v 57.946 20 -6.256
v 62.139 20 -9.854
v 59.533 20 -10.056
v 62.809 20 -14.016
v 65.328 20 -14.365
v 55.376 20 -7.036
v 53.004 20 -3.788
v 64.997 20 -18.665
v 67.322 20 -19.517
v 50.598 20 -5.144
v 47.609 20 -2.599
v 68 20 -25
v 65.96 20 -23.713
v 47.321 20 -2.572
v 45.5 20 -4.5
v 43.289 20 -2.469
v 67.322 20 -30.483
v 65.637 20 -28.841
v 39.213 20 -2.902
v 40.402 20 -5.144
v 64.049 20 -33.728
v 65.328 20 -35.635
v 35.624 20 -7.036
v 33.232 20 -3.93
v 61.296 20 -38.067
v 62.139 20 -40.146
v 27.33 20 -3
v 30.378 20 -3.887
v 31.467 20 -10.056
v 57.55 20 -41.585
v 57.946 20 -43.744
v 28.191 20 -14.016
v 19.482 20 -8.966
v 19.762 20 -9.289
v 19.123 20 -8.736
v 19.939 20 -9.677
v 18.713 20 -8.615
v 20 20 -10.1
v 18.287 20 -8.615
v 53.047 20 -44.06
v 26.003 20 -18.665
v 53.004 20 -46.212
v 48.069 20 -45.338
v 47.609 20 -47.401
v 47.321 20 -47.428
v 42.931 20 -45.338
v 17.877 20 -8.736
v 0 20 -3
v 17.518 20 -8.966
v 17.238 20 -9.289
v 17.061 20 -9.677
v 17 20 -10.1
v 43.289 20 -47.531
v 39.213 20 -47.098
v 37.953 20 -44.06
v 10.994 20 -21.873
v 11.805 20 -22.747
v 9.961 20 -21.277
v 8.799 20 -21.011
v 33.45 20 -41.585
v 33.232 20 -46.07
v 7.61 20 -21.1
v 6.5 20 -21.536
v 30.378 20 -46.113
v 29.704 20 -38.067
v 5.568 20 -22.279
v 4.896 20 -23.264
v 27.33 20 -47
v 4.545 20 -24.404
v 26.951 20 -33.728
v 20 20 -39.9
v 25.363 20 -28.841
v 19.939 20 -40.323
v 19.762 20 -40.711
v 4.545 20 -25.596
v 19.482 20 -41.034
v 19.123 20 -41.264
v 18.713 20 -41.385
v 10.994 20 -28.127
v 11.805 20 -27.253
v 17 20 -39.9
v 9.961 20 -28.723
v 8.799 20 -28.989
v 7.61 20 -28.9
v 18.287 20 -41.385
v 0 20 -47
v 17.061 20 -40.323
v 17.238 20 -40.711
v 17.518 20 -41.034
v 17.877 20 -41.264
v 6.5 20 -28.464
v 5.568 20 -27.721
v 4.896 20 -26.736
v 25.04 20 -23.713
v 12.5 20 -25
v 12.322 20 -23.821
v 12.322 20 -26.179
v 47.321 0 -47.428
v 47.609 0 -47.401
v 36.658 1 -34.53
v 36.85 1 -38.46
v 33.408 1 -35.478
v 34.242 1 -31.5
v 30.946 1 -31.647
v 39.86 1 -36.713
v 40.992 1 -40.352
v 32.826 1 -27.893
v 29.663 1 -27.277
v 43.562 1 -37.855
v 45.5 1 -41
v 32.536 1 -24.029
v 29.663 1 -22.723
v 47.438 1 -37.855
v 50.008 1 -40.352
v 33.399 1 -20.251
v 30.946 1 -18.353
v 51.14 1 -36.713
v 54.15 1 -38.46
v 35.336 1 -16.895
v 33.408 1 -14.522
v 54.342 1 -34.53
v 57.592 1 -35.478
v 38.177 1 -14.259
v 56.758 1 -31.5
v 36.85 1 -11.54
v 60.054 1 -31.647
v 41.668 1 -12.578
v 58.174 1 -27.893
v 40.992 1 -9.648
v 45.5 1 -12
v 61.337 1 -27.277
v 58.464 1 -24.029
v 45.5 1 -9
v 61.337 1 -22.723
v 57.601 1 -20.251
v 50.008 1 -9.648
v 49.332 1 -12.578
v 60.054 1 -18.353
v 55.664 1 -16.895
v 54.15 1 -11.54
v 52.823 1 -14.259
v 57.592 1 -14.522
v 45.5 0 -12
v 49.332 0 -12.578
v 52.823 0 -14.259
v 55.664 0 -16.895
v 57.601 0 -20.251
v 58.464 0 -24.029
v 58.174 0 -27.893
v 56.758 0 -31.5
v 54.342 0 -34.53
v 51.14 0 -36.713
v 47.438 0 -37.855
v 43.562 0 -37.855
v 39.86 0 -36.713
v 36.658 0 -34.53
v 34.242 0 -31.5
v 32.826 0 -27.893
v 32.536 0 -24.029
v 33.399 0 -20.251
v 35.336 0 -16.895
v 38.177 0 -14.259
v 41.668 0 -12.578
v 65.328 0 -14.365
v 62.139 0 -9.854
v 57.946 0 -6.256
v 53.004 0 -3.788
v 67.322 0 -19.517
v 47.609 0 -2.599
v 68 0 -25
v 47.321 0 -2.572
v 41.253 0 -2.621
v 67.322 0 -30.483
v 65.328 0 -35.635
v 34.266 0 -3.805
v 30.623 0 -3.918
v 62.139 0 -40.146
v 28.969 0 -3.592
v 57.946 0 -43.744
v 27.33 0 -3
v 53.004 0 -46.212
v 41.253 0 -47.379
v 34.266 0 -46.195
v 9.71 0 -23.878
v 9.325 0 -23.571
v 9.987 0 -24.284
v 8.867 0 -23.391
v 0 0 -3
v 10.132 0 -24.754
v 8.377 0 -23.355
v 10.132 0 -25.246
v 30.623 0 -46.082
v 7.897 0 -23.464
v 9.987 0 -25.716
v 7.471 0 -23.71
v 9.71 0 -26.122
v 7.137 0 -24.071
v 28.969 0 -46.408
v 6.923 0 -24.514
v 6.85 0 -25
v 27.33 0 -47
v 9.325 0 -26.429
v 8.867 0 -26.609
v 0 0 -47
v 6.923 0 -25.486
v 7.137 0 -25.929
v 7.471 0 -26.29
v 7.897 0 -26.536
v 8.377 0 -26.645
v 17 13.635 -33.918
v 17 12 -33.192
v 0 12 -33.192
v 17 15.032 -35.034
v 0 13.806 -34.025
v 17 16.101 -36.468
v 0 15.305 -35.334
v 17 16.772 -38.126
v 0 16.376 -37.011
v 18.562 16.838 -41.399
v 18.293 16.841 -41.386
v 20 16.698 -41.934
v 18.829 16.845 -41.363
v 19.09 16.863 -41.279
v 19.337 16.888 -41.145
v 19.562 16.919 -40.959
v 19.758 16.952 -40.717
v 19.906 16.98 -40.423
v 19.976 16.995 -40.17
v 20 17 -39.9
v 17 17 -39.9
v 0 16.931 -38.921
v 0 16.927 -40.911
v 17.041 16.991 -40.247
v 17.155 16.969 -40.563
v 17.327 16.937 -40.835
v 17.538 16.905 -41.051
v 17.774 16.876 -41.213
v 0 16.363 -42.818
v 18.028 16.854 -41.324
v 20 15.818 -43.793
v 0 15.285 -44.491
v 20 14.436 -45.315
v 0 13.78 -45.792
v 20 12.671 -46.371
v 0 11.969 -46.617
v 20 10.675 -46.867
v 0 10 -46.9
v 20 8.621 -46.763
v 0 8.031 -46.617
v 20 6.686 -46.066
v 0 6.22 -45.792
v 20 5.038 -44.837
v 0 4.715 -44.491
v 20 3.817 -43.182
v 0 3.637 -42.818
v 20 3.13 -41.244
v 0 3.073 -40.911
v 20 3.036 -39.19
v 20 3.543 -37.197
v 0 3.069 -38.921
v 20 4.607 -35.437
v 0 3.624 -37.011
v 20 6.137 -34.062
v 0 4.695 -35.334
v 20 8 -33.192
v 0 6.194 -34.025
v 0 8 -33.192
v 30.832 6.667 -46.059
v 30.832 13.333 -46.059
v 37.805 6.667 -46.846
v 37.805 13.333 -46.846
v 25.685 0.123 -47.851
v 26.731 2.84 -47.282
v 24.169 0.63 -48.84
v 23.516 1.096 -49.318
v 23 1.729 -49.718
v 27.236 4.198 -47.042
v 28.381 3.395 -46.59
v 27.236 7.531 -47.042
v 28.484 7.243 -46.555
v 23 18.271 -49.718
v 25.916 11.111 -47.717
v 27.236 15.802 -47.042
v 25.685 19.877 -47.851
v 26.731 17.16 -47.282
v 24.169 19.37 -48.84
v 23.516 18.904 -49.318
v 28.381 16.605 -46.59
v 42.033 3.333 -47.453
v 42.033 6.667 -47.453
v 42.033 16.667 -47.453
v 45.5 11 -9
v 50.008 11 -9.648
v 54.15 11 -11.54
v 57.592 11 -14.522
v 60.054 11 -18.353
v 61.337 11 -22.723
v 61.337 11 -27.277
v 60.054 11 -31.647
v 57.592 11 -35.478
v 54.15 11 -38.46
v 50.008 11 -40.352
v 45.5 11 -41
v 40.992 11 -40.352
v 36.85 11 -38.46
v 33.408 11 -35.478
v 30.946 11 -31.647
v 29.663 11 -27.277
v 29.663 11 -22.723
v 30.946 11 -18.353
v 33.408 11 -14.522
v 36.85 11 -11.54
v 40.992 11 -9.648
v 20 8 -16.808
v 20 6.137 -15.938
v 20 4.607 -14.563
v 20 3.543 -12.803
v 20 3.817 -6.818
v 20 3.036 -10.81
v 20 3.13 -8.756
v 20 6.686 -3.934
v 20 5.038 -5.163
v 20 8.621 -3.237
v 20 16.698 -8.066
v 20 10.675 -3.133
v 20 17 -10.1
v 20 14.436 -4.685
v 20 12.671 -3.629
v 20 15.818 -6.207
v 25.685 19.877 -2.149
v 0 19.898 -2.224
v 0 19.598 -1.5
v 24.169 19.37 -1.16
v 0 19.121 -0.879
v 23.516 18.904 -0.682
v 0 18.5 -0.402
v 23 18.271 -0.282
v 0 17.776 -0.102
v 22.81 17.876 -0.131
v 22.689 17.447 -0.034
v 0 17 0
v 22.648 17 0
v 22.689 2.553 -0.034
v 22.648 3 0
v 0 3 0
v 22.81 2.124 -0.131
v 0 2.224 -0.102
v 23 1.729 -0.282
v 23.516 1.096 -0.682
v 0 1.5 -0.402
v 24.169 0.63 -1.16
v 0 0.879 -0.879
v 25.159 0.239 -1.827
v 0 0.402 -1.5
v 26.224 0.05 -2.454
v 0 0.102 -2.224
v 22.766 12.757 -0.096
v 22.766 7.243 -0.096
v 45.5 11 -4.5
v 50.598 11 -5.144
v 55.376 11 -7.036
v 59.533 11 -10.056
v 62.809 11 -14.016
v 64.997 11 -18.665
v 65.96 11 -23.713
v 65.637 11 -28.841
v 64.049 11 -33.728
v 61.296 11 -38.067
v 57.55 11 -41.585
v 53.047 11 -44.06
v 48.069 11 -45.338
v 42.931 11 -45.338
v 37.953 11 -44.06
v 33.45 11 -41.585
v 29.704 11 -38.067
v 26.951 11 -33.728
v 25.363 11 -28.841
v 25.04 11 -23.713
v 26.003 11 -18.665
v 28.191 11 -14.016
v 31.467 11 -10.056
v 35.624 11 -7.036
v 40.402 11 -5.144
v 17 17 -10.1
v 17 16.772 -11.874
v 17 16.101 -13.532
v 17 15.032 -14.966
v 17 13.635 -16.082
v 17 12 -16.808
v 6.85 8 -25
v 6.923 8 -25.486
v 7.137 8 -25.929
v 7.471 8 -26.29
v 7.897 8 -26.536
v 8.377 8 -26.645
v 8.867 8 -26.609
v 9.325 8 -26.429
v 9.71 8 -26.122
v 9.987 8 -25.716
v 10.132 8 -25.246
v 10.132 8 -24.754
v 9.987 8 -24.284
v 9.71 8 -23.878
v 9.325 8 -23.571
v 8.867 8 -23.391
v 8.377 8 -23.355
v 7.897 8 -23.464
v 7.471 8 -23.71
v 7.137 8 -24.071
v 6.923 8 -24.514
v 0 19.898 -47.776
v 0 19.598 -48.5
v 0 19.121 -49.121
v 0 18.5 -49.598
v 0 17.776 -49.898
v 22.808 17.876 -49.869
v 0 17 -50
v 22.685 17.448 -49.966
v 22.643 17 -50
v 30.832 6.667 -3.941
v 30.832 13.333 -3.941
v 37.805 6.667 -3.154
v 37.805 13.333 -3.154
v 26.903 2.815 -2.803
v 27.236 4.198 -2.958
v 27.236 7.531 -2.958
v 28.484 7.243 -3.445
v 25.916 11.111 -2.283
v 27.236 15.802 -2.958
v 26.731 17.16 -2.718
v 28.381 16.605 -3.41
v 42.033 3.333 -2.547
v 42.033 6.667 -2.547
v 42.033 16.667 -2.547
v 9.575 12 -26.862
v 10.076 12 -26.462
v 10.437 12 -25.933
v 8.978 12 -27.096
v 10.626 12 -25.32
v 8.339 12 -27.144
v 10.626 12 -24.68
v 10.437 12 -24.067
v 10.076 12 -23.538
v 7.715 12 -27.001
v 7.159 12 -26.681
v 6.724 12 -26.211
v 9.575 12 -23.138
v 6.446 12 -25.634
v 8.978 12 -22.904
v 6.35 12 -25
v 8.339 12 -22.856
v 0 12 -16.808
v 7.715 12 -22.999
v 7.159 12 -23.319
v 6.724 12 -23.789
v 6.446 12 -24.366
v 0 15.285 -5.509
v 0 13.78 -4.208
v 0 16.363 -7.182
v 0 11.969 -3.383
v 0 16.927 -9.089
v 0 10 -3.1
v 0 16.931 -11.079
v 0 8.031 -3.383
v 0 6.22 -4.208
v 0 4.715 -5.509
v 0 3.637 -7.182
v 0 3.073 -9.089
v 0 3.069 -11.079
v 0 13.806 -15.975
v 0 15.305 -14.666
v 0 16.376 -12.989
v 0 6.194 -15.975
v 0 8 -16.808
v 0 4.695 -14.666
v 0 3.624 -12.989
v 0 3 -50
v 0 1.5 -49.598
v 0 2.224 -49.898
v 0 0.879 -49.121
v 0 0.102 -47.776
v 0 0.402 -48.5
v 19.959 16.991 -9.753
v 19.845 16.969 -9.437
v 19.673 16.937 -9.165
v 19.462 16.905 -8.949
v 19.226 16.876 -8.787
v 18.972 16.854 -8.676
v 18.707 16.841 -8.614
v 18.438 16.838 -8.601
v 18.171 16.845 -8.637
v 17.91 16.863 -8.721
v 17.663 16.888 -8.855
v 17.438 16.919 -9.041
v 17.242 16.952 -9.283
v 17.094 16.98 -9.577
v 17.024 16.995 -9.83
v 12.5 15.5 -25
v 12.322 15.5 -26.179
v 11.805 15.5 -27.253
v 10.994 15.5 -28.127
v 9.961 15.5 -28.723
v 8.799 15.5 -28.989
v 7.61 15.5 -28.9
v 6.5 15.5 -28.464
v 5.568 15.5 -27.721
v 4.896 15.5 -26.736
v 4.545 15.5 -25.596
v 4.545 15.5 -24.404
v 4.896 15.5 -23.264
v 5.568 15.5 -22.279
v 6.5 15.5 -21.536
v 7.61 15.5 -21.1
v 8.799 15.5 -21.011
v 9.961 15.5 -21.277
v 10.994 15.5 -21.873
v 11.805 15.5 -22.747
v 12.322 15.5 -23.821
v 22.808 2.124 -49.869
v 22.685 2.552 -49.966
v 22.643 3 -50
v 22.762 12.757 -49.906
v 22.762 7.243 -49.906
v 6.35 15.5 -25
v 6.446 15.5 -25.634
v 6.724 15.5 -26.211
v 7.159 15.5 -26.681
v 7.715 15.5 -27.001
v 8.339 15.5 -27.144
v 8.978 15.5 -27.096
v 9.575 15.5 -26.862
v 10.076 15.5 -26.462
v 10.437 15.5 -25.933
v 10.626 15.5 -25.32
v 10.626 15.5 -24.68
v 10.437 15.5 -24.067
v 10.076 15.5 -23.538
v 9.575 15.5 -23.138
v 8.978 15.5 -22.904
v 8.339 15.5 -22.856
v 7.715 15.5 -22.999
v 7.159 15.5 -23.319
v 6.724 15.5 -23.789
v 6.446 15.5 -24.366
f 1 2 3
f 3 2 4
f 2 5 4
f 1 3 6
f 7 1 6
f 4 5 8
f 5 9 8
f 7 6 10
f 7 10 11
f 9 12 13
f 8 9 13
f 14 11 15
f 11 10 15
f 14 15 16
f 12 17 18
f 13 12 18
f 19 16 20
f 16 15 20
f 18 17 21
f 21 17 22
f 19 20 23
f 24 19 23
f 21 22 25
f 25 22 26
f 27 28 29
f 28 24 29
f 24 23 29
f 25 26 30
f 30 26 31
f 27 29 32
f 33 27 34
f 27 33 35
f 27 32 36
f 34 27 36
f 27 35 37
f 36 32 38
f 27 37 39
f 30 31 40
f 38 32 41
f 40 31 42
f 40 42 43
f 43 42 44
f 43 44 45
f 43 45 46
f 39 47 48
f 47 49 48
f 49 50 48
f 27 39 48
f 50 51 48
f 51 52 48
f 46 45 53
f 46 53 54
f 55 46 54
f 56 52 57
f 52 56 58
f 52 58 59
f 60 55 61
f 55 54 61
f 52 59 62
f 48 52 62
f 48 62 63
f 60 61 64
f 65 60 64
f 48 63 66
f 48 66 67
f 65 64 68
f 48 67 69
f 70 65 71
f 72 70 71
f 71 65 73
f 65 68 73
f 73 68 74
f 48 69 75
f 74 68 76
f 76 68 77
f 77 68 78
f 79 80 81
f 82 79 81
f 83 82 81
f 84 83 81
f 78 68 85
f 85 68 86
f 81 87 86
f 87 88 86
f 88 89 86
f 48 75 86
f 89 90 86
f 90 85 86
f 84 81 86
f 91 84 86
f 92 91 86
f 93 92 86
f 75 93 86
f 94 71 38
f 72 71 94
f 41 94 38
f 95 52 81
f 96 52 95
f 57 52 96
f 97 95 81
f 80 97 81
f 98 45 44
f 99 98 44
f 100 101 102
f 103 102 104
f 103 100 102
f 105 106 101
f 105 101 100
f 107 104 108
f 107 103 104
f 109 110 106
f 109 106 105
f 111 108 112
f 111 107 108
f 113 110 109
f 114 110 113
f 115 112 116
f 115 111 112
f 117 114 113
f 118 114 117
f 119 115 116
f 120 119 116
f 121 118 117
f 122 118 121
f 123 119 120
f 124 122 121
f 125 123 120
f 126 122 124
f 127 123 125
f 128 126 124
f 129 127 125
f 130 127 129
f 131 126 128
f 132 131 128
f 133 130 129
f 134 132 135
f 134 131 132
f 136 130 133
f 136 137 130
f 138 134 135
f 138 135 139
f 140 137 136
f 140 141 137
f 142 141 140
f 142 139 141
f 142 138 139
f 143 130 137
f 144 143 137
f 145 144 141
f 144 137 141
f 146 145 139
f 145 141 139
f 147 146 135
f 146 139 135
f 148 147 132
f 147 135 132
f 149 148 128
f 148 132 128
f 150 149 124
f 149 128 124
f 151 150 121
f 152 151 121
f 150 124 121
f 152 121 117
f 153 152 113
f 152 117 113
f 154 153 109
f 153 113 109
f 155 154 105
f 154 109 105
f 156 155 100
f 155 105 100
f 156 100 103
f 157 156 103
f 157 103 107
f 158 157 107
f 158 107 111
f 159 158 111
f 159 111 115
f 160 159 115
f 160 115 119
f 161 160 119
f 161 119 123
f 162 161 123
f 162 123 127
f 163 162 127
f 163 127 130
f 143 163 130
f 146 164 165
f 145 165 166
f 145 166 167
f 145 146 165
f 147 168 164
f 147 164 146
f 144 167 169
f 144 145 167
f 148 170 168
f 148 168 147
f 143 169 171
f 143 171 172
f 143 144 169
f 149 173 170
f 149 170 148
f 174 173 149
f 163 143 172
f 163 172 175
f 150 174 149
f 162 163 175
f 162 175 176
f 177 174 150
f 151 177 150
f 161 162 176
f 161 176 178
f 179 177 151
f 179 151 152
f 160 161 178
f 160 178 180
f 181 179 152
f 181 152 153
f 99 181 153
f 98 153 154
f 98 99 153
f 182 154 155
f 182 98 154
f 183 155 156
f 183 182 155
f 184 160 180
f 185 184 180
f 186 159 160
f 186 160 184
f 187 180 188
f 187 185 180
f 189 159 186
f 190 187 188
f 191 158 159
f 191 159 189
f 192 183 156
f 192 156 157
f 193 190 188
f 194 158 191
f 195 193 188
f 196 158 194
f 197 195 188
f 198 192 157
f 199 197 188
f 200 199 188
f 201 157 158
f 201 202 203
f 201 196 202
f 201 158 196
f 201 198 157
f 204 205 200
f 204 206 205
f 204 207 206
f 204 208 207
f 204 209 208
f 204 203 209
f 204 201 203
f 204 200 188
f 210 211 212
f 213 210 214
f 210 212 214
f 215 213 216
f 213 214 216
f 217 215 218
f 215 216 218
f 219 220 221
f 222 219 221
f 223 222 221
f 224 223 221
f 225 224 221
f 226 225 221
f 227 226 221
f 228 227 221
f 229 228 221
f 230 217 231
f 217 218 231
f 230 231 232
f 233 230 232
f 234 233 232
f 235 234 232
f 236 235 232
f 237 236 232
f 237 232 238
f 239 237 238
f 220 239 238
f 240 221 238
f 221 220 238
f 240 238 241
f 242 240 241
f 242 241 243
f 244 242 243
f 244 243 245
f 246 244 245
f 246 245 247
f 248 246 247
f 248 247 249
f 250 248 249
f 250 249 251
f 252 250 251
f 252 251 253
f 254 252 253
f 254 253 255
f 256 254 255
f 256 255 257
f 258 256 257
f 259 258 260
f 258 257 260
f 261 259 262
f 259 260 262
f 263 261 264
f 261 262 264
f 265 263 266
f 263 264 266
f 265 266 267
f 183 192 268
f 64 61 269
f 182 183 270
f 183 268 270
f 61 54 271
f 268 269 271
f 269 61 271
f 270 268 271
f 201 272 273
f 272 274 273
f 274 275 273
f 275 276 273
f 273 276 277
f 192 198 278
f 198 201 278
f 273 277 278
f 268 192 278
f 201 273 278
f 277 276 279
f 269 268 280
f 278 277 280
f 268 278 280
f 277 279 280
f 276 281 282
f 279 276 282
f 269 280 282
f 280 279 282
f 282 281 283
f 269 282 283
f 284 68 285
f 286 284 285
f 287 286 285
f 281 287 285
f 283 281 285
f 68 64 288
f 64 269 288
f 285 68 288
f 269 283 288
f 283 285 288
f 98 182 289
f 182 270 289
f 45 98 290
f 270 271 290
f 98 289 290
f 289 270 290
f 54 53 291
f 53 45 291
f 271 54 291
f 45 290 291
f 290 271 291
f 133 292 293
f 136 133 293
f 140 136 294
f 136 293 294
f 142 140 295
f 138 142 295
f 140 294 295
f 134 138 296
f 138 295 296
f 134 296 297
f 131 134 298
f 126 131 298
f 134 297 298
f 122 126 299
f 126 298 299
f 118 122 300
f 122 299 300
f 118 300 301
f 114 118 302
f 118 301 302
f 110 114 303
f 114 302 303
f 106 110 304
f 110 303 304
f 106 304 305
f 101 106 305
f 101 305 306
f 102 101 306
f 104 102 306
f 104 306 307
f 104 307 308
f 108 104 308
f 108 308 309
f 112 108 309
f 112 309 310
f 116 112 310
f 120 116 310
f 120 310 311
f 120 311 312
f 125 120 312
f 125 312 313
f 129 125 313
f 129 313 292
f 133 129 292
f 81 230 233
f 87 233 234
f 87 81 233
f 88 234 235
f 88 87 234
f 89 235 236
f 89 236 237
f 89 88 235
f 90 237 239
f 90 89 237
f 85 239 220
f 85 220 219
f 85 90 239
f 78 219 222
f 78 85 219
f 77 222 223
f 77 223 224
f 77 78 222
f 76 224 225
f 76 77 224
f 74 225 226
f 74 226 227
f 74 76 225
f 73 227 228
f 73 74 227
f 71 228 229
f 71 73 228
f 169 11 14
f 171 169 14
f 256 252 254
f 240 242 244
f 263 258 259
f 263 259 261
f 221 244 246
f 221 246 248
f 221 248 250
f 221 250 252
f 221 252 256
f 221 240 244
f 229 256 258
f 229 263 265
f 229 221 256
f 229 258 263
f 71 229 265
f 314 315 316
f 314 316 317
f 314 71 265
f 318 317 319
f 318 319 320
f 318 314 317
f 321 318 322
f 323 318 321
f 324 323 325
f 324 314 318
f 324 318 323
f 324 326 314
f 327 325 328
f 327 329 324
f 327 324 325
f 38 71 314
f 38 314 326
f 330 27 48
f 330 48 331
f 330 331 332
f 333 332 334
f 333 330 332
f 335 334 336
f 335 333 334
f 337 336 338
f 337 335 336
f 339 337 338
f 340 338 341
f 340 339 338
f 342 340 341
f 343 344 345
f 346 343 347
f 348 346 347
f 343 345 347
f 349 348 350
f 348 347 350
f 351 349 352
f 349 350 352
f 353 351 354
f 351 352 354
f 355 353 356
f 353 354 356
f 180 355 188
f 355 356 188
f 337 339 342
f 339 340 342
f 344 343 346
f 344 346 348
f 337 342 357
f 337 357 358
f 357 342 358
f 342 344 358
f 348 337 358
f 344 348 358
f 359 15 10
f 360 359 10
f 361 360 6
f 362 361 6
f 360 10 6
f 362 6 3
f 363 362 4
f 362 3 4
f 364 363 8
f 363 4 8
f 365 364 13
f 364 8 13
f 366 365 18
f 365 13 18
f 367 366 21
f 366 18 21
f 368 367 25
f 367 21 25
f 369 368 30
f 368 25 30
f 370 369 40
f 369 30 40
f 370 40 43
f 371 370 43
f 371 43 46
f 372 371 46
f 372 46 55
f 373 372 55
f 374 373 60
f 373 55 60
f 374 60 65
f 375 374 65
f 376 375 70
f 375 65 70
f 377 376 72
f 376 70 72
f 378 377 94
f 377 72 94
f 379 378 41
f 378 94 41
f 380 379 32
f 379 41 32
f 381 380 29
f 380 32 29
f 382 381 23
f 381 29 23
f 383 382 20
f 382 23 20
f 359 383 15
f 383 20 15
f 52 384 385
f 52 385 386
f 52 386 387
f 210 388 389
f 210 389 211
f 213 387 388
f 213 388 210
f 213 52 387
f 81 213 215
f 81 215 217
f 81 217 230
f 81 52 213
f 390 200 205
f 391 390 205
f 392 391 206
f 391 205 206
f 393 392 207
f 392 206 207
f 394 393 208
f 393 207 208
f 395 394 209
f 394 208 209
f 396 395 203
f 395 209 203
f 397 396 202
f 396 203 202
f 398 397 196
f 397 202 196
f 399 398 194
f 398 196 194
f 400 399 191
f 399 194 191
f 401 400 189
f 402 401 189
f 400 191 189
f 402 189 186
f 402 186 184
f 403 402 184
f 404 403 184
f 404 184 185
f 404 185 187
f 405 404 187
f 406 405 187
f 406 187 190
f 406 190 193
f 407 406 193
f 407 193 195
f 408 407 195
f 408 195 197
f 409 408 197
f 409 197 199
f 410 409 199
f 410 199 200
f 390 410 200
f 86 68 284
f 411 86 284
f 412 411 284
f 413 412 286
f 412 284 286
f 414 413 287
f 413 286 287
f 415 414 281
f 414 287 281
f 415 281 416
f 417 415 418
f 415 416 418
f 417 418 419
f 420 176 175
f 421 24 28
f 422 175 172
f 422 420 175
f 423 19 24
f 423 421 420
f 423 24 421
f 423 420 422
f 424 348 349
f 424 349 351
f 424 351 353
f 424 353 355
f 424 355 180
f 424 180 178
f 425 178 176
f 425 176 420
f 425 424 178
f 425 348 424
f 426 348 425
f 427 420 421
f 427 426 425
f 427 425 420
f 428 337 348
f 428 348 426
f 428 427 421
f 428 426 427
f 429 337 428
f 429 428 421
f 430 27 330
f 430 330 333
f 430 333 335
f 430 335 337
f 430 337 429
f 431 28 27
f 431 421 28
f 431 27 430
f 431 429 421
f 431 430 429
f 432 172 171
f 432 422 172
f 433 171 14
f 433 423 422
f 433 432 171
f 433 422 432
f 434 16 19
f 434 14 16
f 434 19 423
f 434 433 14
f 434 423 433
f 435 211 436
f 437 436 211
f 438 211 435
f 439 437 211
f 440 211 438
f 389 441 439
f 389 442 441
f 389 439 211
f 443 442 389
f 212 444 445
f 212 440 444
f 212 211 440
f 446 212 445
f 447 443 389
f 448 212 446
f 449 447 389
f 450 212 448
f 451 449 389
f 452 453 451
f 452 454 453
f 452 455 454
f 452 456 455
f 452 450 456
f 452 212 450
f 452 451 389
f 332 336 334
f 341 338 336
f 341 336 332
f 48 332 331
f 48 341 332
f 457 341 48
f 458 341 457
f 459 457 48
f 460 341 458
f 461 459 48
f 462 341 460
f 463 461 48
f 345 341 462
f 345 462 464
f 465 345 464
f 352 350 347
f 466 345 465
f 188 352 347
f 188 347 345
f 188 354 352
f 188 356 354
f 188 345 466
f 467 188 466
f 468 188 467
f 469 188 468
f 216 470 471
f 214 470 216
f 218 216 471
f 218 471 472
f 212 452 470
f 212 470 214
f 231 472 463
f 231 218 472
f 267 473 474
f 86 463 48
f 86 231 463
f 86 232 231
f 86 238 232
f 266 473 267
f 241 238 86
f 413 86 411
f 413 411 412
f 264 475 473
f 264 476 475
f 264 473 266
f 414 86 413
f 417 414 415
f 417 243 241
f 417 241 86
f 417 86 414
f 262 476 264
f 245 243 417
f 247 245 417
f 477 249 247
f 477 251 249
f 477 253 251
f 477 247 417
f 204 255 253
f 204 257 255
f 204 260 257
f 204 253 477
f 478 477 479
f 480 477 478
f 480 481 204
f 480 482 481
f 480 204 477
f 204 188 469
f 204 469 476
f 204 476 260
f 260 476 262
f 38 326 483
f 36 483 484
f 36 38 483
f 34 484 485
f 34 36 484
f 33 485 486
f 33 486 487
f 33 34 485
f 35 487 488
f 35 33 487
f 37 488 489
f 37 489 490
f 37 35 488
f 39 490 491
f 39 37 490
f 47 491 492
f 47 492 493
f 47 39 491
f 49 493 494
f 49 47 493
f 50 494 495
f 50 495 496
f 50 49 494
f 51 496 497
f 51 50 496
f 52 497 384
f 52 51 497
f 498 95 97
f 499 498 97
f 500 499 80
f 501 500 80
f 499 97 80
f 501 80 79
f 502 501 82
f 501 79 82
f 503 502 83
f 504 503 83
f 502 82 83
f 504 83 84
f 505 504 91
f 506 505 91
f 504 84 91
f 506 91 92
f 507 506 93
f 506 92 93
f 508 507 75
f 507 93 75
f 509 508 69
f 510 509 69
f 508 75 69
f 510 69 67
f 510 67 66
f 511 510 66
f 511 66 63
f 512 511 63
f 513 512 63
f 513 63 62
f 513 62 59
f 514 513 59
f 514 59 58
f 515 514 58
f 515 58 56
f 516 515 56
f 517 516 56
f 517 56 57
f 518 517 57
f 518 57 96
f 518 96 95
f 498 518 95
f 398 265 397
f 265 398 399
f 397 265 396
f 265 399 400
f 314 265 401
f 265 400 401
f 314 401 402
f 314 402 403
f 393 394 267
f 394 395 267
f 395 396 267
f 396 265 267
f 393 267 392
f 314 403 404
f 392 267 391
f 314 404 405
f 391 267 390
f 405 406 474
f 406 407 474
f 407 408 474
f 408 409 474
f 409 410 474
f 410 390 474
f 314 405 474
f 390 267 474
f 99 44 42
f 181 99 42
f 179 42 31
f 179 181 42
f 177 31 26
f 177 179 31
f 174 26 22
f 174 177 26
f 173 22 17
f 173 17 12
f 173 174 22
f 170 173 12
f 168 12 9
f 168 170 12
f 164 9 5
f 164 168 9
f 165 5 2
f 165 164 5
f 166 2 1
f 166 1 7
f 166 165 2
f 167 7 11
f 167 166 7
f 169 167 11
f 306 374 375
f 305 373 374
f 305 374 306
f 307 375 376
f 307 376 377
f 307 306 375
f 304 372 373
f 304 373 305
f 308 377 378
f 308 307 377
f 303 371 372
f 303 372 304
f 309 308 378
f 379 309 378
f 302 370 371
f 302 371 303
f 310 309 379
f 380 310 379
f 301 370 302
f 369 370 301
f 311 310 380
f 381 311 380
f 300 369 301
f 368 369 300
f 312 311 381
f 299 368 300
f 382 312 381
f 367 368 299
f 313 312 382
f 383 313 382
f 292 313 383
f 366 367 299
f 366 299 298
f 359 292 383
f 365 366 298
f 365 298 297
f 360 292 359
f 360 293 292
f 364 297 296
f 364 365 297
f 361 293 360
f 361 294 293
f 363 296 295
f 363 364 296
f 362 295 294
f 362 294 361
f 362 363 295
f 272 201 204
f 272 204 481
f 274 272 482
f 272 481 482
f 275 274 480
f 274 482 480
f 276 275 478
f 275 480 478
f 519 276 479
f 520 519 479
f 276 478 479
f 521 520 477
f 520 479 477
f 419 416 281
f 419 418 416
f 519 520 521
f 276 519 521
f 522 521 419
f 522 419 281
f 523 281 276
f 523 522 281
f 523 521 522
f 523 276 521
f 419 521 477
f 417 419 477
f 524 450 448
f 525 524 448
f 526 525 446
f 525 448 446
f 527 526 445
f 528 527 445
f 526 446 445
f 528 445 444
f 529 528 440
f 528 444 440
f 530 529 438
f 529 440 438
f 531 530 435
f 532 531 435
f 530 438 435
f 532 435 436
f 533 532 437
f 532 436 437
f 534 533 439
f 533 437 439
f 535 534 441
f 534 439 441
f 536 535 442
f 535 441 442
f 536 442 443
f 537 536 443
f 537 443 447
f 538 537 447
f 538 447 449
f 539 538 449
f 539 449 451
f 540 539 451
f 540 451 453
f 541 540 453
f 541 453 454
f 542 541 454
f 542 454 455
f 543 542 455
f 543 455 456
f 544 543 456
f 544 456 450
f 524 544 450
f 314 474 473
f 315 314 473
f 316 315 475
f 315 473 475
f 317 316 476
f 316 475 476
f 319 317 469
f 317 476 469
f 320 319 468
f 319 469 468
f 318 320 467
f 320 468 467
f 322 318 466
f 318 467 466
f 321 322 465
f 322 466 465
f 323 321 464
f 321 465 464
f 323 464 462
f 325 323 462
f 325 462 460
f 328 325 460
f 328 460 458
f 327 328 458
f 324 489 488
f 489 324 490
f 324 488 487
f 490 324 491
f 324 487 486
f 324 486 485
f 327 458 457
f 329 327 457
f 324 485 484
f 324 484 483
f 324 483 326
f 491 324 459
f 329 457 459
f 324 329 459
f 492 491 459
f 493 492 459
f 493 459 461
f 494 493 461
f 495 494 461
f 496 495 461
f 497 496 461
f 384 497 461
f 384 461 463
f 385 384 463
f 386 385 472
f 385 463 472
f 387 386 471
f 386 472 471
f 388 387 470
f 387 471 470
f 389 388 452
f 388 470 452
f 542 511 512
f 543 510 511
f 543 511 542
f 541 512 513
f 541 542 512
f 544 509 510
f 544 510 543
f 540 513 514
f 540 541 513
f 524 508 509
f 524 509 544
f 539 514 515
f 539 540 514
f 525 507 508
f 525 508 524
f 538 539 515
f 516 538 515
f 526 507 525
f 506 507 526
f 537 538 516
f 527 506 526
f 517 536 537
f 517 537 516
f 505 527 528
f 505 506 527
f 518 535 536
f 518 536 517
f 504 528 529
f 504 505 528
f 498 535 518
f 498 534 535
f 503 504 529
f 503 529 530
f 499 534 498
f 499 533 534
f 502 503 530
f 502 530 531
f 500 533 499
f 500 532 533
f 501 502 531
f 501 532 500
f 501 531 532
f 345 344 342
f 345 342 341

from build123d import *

# Parameters (mm, degrees)
EXTRUDE_1_DEPTH             = 20
SKETCH_2_R                  = 7
CUT_EXTRUDE_1_DEPTH         = 20
SKETCH_3_R                  = 13
CUT_EXTRUDE_2_DEPTH         = 87.740993769
SKETCH_4_R                  = 16
CUT_EXTRUDE_3_DEPTH         = 19
CUT_EXTRUDE_9_DEPTH         = 87.740993769
EXTRUDE_START               = -20
EXTRUDE_4_DEPTH             = 20
FILLET_2_R                  = 3
SKETCH_7_R                  = 20.5
CUT_EXTRUDE_10_DEPTH        = 9
SKETCH_8_W                  = 29.8
SKETCH_8_H                  = 4
CUT_EXTRUDE_11_DEPTH        = 20
CUT_EXTRUDE_12_DEPTH        = 10
HOLE_WIZARD_M41_D           = 4.3
HOLE_WIZARD_M41_DEPTH       = 8
HOLE_WIZARD_M41_CBORE_D     = 8
HOLE_WIZARD_M41_CBORE_DEPTH = 4.5
M4X0_71_D                   = 3.3


# Read off the part's stored shape, not the designer's step: Бобышка-Вытянуть4
with BuildPart() as part:
    # Эскиз1 → Бобышка-Вытянуть1 (new body)
    with BuildSketch(Plane(origin=(0, 0, 0), x_dir=(1, 0, 0), z_dir=(0, 1, 0))):
        with BuildLine():
            Line((0, 0), (0, 50))
            Line((0, 50), (20, 50))
            Line((20, 50), (47.60878471, 47.400960405))
            ThreePointArc((47.60878471, 47.400960405), (68, 25), (47.60878471, 2.599039595))
            Line((47.60878471, 2.599039595), (20, 0))
            Line((20, 0), (0, 0))
        make_face()
    extrude(amount=EXTRUDE_1_DEPTH)

    # Эскиз2 → Вырез-Вытянуть1 (cut)
    with BuildSketch(Plane.ZY):
        with Locations((-39.9, 10)):
            Circle(SKETCH_2_R)
        with Locations(Location((-10.1, 10, 0), (0, 0, 180))):
            Circle(SKETCH_2_R)
    extrude(amount=-CUT_EXTRUDE_1_DEPTH, mode=Mode.SUBTRACT)

    # Эскиз3 → Вырез-Вытянуть2 (cut, through all)
    with BuildSketch(Plane(origin=(0, 20, 0), x_dir=(1, 0, 0), z_dir=(0, 1, 0))):
        with Locations(Location((45.5, 25, 0), (0, 0, 270))):
            Circle(SKETCH_3_R)
    extrude(amount=-CUT_EXTRUDE_2_DEPTH, mode=Mode.SUBTRACT)

    # Эскиз4 → Вырез-Вытянуть3 (cut)
    with BuildSketch(Plane(origin=(0, 20, 0), x_dir=(1, 0, 0), z_dir=(0, 1, 0))):
        with Locations(Location((45.5, 25, 0), (0, 0, 270))):
            Circle(SKETCH_4_R)
    extrude(amount=-CUT_EXTRUDE_3_DEPTH, mode=Mode.SUBTRACT)

    # Эскиз5 → Вырез-Вытянуть9 (cut, through all)
    with BuildSketch(Plane(origin=(0, 20, 0), x_dir=(1, 0, 0), z_dir=(0, 1, 0))):
        with BuildLine():
            add(Edge.make_bspline(
                [(47.32108314, 47.428044097), (47.41641101, 47.41948544), (47.512308925, 47.410461109), (47.60878471, 47.400960405)],
                knots=[0.992066387, 0.992066387, 0.992066387, 0.992066387, 1, 1, 1, 1], degree=3))
            Line((47.32108314, 47.428044095), (47.60878471, 47.400960405))
        make_face()
        with BuildLine():
            Line((47.32108314, 47.428044097), (23, 49.717585585))
            add(Edge.make_bspline(
                [(23, 49.717585585), (32.393861284, 42.286998451), (35.400716473, 48.498269788), (47.32108314, 47.428044097)],
                knots=[0, 0, 0, 0, 0.992066387, 0.992066387, 0.992066387, 0.992066387], degree=3))
        make_face()
        with BuildLine():
            add(Edge.make_bspline(
                [(23, 0.282414415), (32.393861284, 7.713001549), (35.400716473, 1.501730212), (47.32108314, 2.571955903)],
                knots=[0, 0, 0, 0, 0.992066387, 0.992066387, 0.992066387, 0.992066387], degree=3))
            Line((23, 0.282414415), (47.32108314, 2.571955903))
        make_face()
        with BuildLine():
            Line((47.60878471, 2.599039595), (47.32108314, 2.571955905))
            add(Edge.make_bspline(
                [(47.32108314, 2.571955903), (47.41641101, 2.58051456), (47.512308925, 2.589538891), (47.60878471, 2.599039595)],
                knots=[0.992066387, 0.992066387, 0.992066387, 0.992066387, 1, 1, 1, 1], degree=3))
        make_face()
    extrude(amount=-CUT_EXTRUDE_9_DEPTH, mode=Mode.SUBTRACT)

    # Бобышка-Вытянуть4 outline → Бобышка-Вытянуть4 (add)
    with BuildSketch(Plane(origin=(0, 20, 0), x_dir=(1, 0, 0), z_dir=(0, 1, 0)).offset(EXTRUDE_START)):
        with BuildLine():
            add(Edge.make_bspline(
                [(22.6429674, 50), (22.761978267, 49.905861862), (22.880989133, 49.811723723), (23, 49.717585585)],
                knots=[-0.012568493, -0.012568493, -0.012568493, -0.012568493, 0, 0, 0, 0], degree=3))
            Line((22.6429674, 50), (20, 50))
            Line((20, 50), (23, 49.717585585))
        make_face()
        with BuildLine():
            Line((20, 0), (22.6479861, 0))
            add(Edge.make_bspline(
                [(22.6479861, 0), (22.766323231, 0.09625734), (22.883651508, 0.190382227), (23, 0.282414415)],
                knots=[-0.012287325, -0.012287325, -0.012287325, -0.012287325, 0, 0, 0, 0], degree=3))
            Line((23, 0.282414415), (20, 0))
        make_face()
    extrude(amount=EXTRUDE_4_DEPTH)

    # Скругление2
    fillet_2_edges = [part.edges().sort_by_distance(p)[0] for p in [
        (11.32399305, 0, 0),
        (11.32399305, 20, 0),
        (11.3214837, 0, -50),
        (11.3214837, 20, -50),
    ]]
    fillet(fillet_2_edges, radius=FILLET_2_R)

    # Эскиз7 → Вырез-Вытянуть10 (cut)
    with BuildSketch(Plane(origin=(0, 20, 0), x_dir=(1, 0, 0), z_dir=(0, 1, 0))):
        with Locations(Location((45.5, 25, 0), (0, 0, 270))):
            Circle(SKETCH_7_R)
    extrude(amount=-CUT_EXTRUDE_10_DEPTH, mode=Mode.SUBTRACT)

    # Эскиз8 → Вырез-Вытянуть11 (cut)
    with BuildSketch(Plane.ZY):
        with Locations((-25, 10)):
            Rectangle(SKETCH_8_W, SKETCH_8_H)
    extrude(amount=-CUT_EXTRUDE_11_DEPTH, mode=Mode.SUBTRACT)

    # Эскиз9 → Вырез-Вытянуть12 (cut)
    with BuildSketch(Plane(origin=(0, 20, 0), x_dir=(1, 0, 0), z_dir=(0, 1, 0))):
        with BuildLine():
            Line((20, 39.9), (20, 10.1))
            ThreePointArc((20, 10.1), (18.5, 8.6), (17, 10.1))
            Line((17, 10.1), (17, 39.9))
            ThreePointArc((17, 39.9), (18.5, 41.4), (20, 39.9))
        make_face()
    extrude(amount=-CUT_EXTRUDE_12_DEPTH, mode=Mode.SUBTRACT)

    # Цековка для винта с внутренним шестигранником M41
    with Locations(Plane(origin=(0, 20, 0), x_dir=(1, 0, 0), z_dir=(0, 1, 0))):
        with Locations((8.5, 25)):
            CounterBoreHole(HOLE_WIZARD_M41_D / 2, HOLE_WIZARD_M41_CBORE_D / 2, HOLE_WIZARD_M41_CBORE_DEPTH, depth=HOLE_WIZARD_M41_DEPTH)

    # Отверстие обработанное метчиком M4x0.71 (through all)
    with Locations(Plane(origin=(0, 8, 0), x_dir=(1, 0, 0), z_dir=(0, 1, 0))):
        with Locations((8.5, 25)):
            Hole(M4X0_71_D / 2)


solid = part.part
